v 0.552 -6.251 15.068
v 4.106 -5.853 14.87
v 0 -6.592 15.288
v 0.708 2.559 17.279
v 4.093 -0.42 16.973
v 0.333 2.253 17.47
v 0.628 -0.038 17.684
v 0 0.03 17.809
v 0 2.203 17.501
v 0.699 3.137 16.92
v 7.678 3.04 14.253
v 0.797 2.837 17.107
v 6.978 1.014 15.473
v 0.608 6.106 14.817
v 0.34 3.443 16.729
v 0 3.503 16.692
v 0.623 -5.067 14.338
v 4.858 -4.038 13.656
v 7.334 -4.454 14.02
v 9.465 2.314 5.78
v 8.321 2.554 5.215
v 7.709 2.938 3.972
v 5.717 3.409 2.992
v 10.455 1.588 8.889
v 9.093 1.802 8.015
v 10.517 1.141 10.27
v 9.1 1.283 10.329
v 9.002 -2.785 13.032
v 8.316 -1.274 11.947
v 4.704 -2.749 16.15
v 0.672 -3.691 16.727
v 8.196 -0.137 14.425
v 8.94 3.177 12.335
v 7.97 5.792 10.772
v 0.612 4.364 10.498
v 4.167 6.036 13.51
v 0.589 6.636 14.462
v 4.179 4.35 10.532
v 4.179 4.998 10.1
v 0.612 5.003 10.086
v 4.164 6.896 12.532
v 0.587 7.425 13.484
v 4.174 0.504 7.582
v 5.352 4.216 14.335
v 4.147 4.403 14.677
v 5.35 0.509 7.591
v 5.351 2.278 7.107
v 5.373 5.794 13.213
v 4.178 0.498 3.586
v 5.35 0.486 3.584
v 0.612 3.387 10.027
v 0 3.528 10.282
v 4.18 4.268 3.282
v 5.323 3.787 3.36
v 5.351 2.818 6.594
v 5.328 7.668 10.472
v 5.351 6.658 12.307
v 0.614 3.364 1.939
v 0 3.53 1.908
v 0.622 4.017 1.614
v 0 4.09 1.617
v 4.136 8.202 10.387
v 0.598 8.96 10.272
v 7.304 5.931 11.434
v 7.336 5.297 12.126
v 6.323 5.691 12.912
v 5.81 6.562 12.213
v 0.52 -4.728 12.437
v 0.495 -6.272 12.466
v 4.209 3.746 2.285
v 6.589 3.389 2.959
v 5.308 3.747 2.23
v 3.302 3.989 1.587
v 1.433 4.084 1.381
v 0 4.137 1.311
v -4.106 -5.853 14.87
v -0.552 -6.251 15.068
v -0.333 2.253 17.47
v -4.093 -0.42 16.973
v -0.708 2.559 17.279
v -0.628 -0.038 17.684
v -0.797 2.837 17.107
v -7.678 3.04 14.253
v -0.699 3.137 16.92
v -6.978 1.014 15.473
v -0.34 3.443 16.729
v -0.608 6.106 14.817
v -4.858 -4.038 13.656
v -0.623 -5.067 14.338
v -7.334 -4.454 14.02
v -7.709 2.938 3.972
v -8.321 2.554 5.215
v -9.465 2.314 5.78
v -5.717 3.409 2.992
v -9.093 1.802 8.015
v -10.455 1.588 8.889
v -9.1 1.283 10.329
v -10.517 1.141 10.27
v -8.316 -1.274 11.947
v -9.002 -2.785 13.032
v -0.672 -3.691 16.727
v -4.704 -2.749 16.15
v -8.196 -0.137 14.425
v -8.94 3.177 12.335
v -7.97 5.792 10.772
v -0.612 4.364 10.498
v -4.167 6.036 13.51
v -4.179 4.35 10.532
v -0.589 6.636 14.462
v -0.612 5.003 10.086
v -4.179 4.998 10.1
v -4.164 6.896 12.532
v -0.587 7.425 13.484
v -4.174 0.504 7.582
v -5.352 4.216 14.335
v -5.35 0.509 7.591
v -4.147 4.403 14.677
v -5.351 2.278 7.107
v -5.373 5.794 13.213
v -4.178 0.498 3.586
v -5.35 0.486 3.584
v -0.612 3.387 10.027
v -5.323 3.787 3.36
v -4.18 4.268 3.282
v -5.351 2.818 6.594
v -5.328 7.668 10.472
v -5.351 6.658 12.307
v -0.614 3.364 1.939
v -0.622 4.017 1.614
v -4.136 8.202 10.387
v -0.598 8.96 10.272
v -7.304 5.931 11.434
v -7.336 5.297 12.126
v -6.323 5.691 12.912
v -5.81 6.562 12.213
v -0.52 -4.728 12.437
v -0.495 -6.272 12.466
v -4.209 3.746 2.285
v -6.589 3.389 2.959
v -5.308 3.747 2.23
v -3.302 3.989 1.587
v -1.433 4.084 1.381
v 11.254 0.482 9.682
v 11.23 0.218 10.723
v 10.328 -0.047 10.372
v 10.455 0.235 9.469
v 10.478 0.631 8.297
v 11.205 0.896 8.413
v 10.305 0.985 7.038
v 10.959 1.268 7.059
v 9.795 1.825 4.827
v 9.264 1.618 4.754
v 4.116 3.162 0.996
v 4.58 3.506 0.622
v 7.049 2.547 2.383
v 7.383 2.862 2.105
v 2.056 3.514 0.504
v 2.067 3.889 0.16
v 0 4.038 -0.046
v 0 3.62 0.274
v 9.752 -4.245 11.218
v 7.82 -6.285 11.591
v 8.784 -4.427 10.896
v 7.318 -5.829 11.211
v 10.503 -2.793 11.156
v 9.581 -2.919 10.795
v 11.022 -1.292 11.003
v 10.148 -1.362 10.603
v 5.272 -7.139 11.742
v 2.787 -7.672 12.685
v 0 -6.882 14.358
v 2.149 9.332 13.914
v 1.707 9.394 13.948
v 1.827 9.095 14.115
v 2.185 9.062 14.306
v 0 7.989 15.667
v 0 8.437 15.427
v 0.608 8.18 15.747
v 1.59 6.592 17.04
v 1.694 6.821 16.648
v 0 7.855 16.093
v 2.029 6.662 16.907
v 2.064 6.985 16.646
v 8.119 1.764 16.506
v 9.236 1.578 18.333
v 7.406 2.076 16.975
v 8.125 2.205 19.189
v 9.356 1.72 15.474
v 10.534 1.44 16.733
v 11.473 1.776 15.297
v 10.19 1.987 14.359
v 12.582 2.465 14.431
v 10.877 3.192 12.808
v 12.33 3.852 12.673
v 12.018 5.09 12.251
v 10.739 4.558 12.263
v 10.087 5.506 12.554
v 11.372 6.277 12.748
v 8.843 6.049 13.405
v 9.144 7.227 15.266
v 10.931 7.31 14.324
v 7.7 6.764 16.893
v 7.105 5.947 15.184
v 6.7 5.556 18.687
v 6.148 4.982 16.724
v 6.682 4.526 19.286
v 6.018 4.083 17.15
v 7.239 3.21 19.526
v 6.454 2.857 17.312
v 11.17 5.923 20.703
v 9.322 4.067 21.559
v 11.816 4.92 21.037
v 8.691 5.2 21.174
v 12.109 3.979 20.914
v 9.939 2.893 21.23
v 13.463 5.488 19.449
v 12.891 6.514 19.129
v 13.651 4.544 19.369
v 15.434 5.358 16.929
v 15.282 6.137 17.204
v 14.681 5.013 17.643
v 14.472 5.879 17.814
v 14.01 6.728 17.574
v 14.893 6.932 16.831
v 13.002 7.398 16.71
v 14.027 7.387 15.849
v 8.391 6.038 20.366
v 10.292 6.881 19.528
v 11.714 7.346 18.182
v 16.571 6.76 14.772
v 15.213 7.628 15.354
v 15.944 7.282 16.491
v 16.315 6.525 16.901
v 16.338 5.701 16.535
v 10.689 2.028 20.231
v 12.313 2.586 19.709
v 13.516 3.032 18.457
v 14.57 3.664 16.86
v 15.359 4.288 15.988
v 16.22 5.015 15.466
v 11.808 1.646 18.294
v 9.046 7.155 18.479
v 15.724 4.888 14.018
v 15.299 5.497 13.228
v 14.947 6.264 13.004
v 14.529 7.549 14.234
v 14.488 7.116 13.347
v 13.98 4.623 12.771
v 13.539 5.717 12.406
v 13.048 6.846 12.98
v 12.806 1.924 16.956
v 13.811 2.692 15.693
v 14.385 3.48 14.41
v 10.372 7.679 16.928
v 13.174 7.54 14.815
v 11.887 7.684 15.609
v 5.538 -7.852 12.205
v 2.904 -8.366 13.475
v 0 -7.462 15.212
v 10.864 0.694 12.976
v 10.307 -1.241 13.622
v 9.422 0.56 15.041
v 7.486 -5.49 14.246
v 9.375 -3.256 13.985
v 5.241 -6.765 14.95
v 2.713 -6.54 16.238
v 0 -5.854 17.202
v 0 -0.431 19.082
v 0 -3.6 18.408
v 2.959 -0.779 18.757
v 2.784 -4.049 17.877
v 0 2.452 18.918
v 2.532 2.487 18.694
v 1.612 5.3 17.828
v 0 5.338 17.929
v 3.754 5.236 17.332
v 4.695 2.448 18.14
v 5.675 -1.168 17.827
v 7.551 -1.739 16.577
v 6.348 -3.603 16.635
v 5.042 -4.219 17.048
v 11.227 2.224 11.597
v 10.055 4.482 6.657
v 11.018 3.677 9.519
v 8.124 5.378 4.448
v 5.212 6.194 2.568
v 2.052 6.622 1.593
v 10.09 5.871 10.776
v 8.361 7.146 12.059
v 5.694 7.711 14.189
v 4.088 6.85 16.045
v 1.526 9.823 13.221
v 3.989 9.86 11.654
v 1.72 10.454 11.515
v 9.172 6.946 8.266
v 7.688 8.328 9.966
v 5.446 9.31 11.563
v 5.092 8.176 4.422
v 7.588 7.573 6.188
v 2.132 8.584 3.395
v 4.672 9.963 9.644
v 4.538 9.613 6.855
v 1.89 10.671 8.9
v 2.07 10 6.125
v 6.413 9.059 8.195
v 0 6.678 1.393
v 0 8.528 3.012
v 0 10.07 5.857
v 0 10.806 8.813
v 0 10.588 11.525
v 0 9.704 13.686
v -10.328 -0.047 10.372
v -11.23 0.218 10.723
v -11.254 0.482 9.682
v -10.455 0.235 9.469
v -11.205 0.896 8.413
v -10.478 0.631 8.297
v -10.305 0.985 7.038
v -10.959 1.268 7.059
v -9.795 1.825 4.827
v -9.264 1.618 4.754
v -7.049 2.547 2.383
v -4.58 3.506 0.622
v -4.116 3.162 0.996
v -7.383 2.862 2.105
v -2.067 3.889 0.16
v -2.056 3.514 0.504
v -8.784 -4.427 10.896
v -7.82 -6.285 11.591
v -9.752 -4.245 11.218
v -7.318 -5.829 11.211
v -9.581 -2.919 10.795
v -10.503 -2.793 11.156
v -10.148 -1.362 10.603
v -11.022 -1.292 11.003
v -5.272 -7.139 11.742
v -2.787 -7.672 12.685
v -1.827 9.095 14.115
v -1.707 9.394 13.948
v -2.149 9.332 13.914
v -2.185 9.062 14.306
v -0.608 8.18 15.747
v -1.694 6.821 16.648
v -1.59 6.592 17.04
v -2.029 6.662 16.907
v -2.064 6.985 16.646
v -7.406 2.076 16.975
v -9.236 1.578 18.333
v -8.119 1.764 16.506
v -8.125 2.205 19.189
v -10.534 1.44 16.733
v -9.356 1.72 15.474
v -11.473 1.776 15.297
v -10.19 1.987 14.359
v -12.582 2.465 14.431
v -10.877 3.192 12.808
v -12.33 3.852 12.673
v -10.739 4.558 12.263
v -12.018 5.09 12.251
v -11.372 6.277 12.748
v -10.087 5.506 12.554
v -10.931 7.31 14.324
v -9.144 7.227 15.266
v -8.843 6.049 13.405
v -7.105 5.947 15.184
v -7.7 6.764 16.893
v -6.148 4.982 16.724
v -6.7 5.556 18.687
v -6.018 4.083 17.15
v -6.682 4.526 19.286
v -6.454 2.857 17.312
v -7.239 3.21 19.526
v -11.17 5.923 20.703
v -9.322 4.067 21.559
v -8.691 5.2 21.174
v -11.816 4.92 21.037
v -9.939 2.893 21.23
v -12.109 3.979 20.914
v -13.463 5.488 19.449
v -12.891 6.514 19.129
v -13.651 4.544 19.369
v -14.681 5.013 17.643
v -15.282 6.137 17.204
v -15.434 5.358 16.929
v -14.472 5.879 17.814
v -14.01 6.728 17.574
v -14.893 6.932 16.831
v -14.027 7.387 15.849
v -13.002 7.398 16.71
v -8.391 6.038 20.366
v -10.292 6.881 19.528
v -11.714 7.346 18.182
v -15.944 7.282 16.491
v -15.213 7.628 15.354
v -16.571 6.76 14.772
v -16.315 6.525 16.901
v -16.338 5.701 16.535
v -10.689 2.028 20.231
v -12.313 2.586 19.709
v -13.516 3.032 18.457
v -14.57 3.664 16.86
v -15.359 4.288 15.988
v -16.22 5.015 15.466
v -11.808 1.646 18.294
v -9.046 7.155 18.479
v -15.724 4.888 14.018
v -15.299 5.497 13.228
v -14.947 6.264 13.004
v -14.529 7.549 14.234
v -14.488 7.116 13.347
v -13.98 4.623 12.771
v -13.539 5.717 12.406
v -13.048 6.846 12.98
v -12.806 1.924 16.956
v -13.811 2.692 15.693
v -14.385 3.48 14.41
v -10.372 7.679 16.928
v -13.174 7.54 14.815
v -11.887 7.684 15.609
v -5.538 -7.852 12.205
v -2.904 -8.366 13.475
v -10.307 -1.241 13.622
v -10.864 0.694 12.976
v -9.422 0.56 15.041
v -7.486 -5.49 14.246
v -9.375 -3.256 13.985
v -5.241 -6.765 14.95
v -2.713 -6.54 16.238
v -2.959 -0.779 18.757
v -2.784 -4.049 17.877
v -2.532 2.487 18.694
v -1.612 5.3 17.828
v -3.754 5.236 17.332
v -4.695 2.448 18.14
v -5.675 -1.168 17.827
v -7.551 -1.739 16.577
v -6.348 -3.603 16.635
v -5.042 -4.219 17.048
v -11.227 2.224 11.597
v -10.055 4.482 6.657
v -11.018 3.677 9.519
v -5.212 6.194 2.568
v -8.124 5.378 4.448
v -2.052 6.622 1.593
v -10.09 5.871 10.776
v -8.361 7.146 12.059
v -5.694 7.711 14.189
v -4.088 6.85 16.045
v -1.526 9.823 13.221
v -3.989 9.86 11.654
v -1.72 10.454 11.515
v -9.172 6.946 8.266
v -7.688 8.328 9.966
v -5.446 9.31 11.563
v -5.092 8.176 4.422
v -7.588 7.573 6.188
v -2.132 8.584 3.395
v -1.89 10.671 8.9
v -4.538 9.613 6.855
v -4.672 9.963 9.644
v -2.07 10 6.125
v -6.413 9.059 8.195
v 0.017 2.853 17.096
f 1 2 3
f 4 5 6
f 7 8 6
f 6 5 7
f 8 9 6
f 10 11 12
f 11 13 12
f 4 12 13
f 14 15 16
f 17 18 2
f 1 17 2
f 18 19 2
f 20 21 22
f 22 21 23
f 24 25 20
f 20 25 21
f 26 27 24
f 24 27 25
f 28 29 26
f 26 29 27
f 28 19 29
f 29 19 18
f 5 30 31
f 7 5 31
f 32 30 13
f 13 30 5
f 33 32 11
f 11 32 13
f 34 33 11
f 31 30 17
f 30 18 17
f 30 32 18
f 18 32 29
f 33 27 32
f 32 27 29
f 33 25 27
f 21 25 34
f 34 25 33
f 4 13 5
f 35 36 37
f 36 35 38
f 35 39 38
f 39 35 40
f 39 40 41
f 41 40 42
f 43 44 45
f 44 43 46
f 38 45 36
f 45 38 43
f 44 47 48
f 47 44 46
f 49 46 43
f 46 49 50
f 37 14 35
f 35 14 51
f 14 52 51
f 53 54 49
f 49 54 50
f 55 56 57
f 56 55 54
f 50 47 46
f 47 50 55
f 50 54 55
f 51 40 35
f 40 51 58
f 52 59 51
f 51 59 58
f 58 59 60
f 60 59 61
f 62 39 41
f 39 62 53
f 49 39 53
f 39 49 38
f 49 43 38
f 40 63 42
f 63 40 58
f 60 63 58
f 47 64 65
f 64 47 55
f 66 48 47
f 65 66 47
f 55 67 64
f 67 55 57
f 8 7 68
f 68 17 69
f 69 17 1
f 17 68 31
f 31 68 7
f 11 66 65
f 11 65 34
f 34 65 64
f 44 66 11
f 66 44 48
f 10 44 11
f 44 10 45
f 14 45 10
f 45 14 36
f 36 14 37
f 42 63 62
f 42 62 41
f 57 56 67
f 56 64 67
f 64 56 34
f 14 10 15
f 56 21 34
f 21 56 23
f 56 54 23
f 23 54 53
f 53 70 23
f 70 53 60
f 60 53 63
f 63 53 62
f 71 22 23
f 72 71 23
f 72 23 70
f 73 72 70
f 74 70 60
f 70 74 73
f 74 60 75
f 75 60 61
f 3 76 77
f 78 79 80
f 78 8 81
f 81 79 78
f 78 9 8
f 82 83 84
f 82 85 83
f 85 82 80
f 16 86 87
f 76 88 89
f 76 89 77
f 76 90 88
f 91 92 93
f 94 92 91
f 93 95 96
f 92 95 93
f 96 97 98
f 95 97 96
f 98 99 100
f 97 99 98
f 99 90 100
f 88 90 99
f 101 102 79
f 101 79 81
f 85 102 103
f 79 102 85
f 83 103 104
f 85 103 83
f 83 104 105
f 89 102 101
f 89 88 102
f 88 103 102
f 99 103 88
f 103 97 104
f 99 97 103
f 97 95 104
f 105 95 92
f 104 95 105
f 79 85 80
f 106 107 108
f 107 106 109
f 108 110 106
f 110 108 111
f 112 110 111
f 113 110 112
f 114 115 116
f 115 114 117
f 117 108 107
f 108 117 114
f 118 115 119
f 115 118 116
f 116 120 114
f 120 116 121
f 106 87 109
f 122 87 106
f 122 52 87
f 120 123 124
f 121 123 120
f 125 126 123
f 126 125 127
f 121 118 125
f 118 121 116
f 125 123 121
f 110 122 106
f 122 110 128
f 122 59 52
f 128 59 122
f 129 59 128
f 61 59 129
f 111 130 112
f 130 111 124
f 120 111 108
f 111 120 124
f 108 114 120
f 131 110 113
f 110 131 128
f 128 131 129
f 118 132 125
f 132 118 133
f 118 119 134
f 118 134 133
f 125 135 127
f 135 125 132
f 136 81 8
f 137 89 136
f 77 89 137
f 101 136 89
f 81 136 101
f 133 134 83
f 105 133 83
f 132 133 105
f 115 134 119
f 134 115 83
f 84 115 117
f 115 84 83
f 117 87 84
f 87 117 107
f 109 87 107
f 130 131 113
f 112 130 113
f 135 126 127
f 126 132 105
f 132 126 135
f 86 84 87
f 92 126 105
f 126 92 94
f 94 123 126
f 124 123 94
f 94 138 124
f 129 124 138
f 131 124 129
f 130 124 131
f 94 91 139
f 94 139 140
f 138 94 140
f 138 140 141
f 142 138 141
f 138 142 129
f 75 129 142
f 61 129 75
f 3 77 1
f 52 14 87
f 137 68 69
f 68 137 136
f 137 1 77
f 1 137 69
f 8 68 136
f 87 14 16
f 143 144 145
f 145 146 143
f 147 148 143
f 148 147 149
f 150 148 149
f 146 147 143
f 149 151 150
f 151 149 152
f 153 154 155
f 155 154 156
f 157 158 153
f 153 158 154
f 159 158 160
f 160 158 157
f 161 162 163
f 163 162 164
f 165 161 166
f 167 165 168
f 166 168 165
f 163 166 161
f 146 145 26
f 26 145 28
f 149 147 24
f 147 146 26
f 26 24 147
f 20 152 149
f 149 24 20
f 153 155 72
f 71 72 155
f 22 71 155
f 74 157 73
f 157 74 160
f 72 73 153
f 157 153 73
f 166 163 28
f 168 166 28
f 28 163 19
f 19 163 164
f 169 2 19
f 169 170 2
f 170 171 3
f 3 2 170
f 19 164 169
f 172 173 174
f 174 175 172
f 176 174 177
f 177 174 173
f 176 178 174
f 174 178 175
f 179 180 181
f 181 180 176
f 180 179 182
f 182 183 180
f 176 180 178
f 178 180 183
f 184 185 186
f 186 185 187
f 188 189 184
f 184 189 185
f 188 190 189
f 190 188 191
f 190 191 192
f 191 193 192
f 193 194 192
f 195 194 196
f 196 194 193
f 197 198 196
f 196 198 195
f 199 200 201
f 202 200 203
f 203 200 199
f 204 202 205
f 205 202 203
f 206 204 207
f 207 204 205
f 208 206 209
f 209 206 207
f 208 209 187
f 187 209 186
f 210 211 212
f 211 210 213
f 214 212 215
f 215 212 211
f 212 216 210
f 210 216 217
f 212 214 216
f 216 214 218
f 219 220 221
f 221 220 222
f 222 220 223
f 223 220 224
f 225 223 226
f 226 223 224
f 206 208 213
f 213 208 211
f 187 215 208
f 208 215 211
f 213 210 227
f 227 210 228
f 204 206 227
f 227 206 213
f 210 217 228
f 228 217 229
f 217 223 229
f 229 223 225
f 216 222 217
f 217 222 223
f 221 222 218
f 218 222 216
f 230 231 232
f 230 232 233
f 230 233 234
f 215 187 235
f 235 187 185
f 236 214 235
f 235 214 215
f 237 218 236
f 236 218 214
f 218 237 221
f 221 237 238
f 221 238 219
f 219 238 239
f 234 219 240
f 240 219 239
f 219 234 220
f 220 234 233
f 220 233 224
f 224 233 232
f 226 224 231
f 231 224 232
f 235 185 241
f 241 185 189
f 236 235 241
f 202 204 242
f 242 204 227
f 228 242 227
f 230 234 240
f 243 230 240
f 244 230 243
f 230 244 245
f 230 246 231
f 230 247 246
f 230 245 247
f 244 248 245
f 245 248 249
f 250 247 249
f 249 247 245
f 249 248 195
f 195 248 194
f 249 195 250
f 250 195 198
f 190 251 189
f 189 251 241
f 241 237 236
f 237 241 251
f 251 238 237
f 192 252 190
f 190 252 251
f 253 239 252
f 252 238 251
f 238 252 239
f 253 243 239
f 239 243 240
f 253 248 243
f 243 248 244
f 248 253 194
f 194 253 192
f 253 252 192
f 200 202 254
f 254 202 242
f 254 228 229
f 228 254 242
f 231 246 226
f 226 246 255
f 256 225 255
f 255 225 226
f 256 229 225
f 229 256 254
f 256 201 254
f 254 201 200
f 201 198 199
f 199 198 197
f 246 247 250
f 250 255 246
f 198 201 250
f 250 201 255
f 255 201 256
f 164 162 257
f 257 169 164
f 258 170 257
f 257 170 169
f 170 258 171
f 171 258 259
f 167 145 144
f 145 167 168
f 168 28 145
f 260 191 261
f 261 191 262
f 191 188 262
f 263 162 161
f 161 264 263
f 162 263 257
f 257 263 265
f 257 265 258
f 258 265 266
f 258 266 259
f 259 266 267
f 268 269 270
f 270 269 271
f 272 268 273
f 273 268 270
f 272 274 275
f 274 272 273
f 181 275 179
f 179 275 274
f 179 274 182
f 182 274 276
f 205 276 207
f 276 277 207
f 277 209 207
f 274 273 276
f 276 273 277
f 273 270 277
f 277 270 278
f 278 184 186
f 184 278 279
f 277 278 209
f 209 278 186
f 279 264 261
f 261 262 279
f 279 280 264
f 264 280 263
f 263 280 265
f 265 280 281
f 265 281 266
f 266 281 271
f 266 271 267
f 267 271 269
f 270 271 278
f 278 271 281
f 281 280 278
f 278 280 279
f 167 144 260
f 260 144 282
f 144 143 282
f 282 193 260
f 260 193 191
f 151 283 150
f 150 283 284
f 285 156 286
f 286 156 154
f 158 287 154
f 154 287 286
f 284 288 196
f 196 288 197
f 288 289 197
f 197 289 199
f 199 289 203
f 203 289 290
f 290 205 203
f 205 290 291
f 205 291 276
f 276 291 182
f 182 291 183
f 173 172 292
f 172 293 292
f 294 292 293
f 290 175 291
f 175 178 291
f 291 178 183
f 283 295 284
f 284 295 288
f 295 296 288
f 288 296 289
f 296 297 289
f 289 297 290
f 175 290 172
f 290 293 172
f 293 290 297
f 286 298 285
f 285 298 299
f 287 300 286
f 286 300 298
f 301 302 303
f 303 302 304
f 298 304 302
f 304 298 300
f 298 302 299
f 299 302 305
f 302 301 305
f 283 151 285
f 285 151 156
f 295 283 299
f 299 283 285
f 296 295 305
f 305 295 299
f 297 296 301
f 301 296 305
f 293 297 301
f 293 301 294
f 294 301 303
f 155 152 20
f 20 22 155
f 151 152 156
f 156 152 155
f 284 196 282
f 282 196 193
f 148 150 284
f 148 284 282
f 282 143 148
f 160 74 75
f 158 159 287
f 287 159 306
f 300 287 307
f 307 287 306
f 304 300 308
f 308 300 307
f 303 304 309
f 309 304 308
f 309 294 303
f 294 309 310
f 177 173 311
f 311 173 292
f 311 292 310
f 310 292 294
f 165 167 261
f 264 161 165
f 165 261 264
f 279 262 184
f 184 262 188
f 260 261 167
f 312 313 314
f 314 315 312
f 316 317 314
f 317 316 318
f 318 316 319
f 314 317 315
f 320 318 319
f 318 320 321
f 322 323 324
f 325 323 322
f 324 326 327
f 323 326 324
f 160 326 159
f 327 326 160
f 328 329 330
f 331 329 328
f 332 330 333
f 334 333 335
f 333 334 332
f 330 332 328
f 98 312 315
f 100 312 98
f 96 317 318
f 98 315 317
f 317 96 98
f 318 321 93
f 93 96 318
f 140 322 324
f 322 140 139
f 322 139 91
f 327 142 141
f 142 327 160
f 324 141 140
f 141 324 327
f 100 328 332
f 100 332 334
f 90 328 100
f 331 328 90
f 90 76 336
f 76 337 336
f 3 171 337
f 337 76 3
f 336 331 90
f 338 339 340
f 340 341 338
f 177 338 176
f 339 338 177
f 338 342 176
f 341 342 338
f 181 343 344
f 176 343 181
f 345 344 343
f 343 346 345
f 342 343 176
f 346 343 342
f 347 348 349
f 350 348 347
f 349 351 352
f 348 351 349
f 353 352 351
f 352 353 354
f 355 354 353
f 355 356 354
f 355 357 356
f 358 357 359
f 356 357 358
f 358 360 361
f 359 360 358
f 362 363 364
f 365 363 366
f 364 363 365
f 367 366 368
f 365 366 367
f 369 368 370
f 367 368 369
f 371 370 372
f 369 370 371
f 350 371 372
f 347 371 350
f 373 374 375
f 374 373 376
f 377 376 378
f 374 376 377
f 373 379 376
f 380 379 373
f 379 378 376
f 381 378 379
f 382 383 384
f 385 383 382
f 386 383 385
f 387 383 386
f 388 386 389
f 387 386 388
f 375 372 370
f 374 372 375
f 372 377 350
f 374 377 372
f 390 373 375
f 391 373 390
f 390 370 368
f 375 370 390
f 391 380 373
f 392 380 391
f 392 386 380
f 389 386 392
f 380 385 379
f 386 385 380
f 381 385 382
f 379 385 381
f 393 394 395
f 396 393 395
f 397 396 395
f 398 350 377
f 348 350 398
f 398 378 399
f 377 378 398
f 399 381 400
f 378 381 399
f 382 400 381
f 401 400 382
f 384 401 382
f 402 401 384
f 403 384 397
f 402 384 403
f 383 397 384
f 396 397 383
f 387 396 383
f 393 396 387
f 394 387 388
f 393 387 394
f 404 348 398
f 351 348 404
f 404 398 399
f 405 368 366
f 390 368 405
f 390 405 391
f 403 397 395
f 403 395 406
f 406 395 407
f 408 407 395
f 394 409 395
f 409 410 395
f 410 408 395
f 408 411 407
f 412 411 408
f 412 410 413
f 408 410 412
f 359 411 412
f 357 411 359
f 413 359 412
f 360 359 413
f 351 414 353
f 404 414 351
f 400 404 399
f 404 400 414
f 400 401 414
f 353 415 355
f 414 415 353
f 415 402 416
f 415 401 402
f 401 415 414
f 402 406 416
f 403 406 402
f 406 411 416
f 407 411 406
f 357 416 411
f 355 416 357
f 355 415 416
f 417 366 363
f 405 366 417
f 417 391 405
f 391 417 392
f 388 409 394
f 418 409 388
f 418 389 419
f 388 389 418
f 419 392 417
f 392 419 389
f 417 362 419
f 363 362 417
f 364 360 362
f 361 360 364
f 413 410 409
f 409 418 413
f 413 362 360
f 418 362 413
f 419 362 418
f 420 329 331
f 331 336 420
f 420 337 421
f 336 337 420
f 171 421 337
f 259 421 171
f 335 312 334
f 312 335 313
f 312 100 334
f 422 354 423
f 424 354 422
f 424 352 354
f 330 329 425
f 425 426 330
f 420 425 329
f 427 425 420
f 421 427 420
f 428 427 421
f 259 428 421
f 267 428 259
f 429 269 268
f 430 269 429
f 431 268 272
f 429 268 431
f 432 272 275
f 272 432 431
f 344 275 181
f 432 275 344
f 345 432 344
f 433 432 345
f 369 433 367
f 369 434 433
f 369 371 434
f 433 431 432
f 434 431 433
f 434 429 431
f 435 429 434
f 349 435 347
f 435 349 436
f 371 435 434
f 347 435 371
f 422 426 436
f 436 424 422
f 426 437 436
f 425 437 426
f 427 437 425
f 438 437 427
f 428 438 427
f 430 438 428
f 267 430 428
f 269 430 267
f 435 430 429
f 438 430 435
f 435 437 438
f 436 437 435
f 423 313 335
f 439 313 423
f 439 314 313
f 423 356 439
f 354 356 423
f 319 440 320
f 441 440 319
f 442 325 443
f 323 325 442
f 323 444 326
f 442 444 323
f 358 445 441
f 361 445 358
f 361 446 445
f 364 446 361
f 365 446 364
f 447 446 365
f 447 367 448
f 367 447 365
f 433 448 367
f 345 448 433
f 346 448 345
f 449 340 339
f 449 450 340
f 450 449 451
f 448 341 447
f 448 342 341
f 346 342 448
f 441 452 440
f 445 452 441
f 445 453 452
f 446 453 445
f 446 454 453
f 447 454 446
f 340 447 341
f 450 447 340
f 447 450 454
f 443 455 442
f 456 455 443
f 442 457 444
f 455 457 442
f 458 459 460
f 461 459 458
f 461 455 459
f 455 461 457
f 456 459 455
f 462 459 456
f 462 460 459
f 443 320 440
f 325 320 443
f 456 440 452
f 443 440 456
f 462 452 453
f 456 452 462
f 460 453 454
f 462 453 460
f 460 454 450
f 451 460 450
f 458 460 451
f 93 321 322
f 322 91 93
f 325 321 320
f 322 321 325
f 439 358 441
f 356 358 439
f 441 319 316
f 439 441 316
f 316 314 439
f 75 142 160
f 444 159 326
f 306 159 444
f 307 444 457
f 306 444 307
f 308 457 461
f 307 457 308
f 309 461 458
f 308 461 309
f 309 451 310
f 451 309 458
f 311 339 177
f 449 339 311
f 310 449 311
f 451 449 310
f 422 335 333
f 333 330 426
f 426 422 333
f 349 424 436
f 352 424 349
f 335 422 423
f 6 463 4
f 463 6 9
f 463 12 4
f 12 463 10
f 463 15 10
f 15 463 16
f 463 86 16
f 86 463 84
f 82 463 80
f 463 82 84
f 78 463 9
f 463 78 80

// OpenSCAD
use <../lib.scad>
use <s/u9446s01.scad>
use <s/u9447s01.scad>
function ldraw_lib__u9446() = [
// 0 ~Minifig Hair Powerpuff Girls Bubbles
// 0 Name: u9446.dat
// 0 Author: Magnus Forsberg [MagFors]
// 0 !LDRAW_ORG Part UPDATE 2023-05
// 0 !LICENSE Licensed under CC BY 4.0 : see CAreadme.txt
// 
// 0 BFC CERTIFY CCW
  [0,"BFC","CERTIFY"],
  [0,"BFC","CCW"],
// 
// 0 !HISTORY 2023-10-31 [OrionP] Official Update 2023-05
// 
// 
// 1 16 0 0 0 1 0 0 0 1 0 0 0 1 s\u9447s01.dat
  [1,16,0,0,0,1,0,0,0,1,0,0,0,1, ldraw_lib__s__u9447s01()],
// 1 16 0 0 0 1 0 0 0 1 0 0 0 1 s\u9446s01.dat
  [1,16,0,0,0,1,0,0,0,1,0,0,0,1, ldraw_lib__s__u9446s01()],
// 1 16 0 0 0 -1 0 0 0 1 0 0 0 1 s\u9446s01.dat
  [1,16,0,0,0,-1,0,0,0,1,0,0,0,1, ldraw_lib__s__u9446s01()],
// 
// 4 16 .833 -43.674 5.633 0 -43.753 5.507 .042 -42.741 7.1325 1.77 -43.198 6.398
  [4,16,.833,-43.674,5.633,0,-43.753,5.507,.042,-42.741,7.1325,1.77,-43.198,6.398],
// 4 16 1.993 -42.767 7.092 1.77 -43.198 6.398 .042 -42.741 7.1325 1.747 -42.299 7.842
  [4,16,1.993,-42.767,7.092,1.77,-43.198,6.398,.042,-42.741,7.1325,1.747,-42.299,7.842],
// 4 16 .85 -41.823 8.608 1.747 -42.299 7.842 .042 -42.741 7.1325 0 -41.729 8.758
  [4,16,.85,-41.823,8.608,1.747,-42.299,7.842,.042,-42.741,7.1325,0,-41.729,8.758],
// 4 16 -.85 -41.823 8.608 0 -41.729 8.758 .042 -42.741 7.1325 -1.747 -42.299 7.842
  [4,16,-.85,-41.823,8.608,0,-41.729,8.758,.042,-42.741,7.1325,-1.747,-42.299,7.842],
// 4 16 -1.993 -42.767 7.092 -1.747 -42.299 7.842 .042 -42.741 7.1325 -1.77 -43.198 6.398
  [4,16,-1.993,-42.767,7.092,-1.747,-42.299,7.842,.042,-42.741,7.1325,-1.77,-43.198,6.398],
// 4 16 -.833 -43.674 5.633 -1.77 -43.198 6.398 .042 -42.741 7.1325 0 -43.753 5.507
  [4,16,-.833,-43.674,5.633,-1.77,-43.198,6.398,.042,-42.741,7.1325,0,-43.753,5.507],
// 5 24 0 -41.729 8.758 -.85 -41.823 8.608 -1.435 -37.043 15.265 .042 -42.741 7.1325
  [5,24,0,-41.729,8.758,-.85,-41.823,8.608,-1.435,-37.043,15.265,.042,-42.741,7.1325],
// 5 24 -1.77 -43.198 6.398 -.833 -43.674 5.633 .042 -42.741 7.1325 -10.148 -42.433 -1.051
  [5,24,-1.77,-43.198,6.398,-.833,-43.674,5.633,.042,-42.741,7.1325,-10.148,-42.433,-1.051],
// 5 24 1.747 -42.299 7.842 .85 -41.823 8.608 .042 -42.741 7.1325 1.519 -37.043 15.265
  [5,24,1.747,-42.299,7.842,.85,-41.823,8.608,.042,-42.741,7.1325,1.519,-37.043,15.265],
// 5 24 -1.747 -42.299 7.842 -1.993 -42.767 7.092 .042 -42.741 7.1325 -19.11 -35.633 7.599
  [5,24,-1.747,-42.299,7.842,-1.993,-42.767,7.092,.042,-42.741,7.1325,-19.11,-35.633,7.599],
// 5 24 -1.993 -42.767 7.092 -1.77 -43.198 6.398 -1.747 -42.299 7.842 -17.36 -38.683 2.536
  [5,24,-1.993,-42.767,7.092,-1.77,-43.198,6.398,-1.747,-42.299,7.842,-17.36,-38.683,2.536],
// 5 24 .833 -43.674 5.633 1.77 -43.198 6.398 0 -43.753 5.507 10.232 -42.433 -1.051
  [5,24,.833,-43.674,5.633,1.77,-43.198,6.398,0,-43.753,5.507,10.232,-42.433,-1.051],
// 5 24 1.77 -43.198 6.398 1.993 -42.767 7.092 .042 -42.741 7.1325 17.444 -38.683 2.536
  [5,24,1.77,-43.198,6.398,1.993,-42.767,7.092,.042,-42.741,7.1325,17.444,-38.683,2.536],
// 5 24 .85 -41.823 8.608 0 -41.729 8.758 1.519 -37.043 15.265 1.747 -42.299 7.842
  [5,24,.85,-41.823,8.608,0,-41.729,8.758,1.519,-37.043,15.265,1.747,-42.299,7.842],
// 5 24 -.85 -41.823 8.608 -1.747 -42.299 7.842 -1.435 -37.043 15.265 0 -41.729 8.758
  [5,24,-.85,-41.823,8.608,-1.747,-42.299,7.842,-1.435,-37.043,15.265,0,-41.729,8.758],
// 5 24 -.833 -43.674 5.633 0 -43.753 5.507 -1.77 -43.198 6.398 0 -44.522 .075
  [5,24,-.833,-43.674,5.633,0,-43.753,5.507,-1.77,-43.198,6.398,0,-44.522,.075],
// 5 24 0 -43.753 5.507 .833 -43.674 5.633 0 -44.522 .075 .042 -42.741 7.1325
  [5,24,0,-43.753,5.507,.833,-43.674,5.633,0,-44.522,.075,.042,-42.741,7.1325],
// 5 24 1.993 -42.767 7.092 1.747 -42.299 7.842 1.77 -43.198 6.398 19.194 -35.633 7.599
  [5,24,1.993,-42.767,7.092,1.747,-42.299,7.842,1.77,-43.198,6.398,19.194,-35.633,7.599],
// 
// 5 24 0 -14.643 25.174 0 -22.033 27.015 5.176 -15.313 24.999 -5.176 -15.313 24.999
  [5,24,0,-14.643,25.174,0,-22.033,27.015,5.176,-15.313,24.999,-5.176,-15.313,24.999],
// 5 24 0 -46.02 -8.999 0 -43.006 -14.635 -6.961 -44.693 -10.123 6.961 -44.693 -10.123
  [5,24,0,-46.02,-8.999,0,-43.006,-14.635,-6.961,-44.693,-10.123,6.961,-44.693,-10.123],
// 5 24 0 -34.215 24.259 0 -38.567 21.092 4.268 -34.871 23.485 -4.268 -34.871 23.485
  [5,24,0,-34.215,24.259,0,-38.567,21.092,4.268,-34.871,23.485,-4.268,-34.871,23.485],
// 5 24 0 -40.232 19.637 0 -44.822 13.345 3.975 -42.6 16.481 -3.975 -42.6 16.481
  [5,24,0,-40.232,19.637,0,-44.822,13.345,3.975,-42.6,16.481,-3.975,-42.6,16.481],
// 5 24 0 -47.294 6.131 0 -47.704 -1.078 -6.331 -46.736 6.217 6.331 -46.736 6.217
  [5,24,0,-47.294,6.131,0,-47.704,-1.078,-6.331,-46.736,6.217,6.331,-46.736,6.217],
// 5 24 0 -22.033 27.015 0 -28.813 26.469 4.3 -28.787 26.134 -4.3 -28.787 26.134
  [5,24,0,-22.033,27.015,0,-28.813,26.469,4.3,-28.787,26.134,-4.3,-28.787,26.134],
// 5 24 0 -47.704 -1.078 0 -46.02 -8.999 7.398 -46.893 -1.947 -7.398 -46.893 -1.947
  [5,24,0,-47.704,-1.078,0,-46.02,-8.999,7.398,-46.893,-1.947,-7.398,-46.893,-1.947],
// 5 24 0 -28.813 26.469 0 -34.215 24.259 -3.814 -33.053 24.557 3.814 -33.053 24.557
  [5,24,0,-28.813,26.469,0,-34.215,24.259,-3.814,-33.053,24.557,3.814,-33.053,24.557],
// 5 24 0 -38.567 21.092 0 -39.167 19.972 -4.568 -35.287 22.738 4.568 -35.287 22.738
  [5,24,0,-38.567,21.092,0,-39.167,19.972,-4.568,-35.287,22.738,4.568,-35.287,22.738],
// 5 24 0 -7.529 21.319 0 -14.643 25.174 -5.329 -8.487 21.461 5.329 -8.487 21.461
  [5,24,0,-7.529,21.319,0,-14.643,25.174,-5.329,-8.487,21.461,5.329,-8.487,21.461],
// 5 24 0 -3.482 16.694 0 -7.529 21.319 -5.129 -3.982 16.554 5.129 -3.982 16.554
  [5,24,0,-3.482,16.694,0,-7.529,21.319,-5.129,-3.982,16.554,5.129,-3.982,16.554],
// 5 24 0 -39.167 19.972 0 -40.232 19.637 4.234 -41.619 17.053 -4.234 -41.619 17.053
  [5,24,0,-39.167,19.972,0,-40.232,19.637,4.234,-41.619,17.053,-4.234,-41.619,17.053],
// 5 24 0 -44.822 13.345 0 -47.294 6.131 -4.029 -44.57 13.251 4.029 -44.57 13.251
  [5,24,0,-44.822,13.345,0,-47.294,6.131,-4.029,-44.57,13.251,4.029,-44.57,13.251],
// 2 24 0 -38.03 -18.655 0 -35.896 -17.204
  [2,24,0,-38.03,-18.655,0,-35.896,-17.204],
// 5 24 0 -43.006 -14.635 0 -38.03 -18.655 6.783 -40.594 -16.349 -6.783 -40.594 -16.349
  [5,24,0,-43.006,-14.635,0,-38.03,-18.655,6.783,-40.594,-16.349,-6.783,-40.594,-16.349],
// 5 24 0 -.686 9.051 0 .114 10.094 -5.167 -.4 9.723 5.167 -.4 9.723
  [5,24,0,-.686,9.051,0,.114,10.094,-5.167,-.4,9.723,5.167,-.4,9.723],
// 5 24 0 .114 10.094 0 -3.482 16.694 -5.129 -3.982 16.554 5.129 -3.982 16.554
  [5,24,0,.114,10.094,0,-3.482,16.694,-5.129,-3.982,16.554,5.129,-3.982,16.554],
// 5 24 0 -35.896 -17.204 0 -38.22 -16.481 -6.968 -31.712 -19.179 6.968 -31.712 -19.179
  [5,24,0,-35.896,-17.204,0,-38.22,-16.481,-6.968,-31.712,-19.179,6.968,-31.712,-19.179],
// 5 24 0 -3.278 10.342 0 -.686 9.051 3.583 -3.453 10.211 -3.583 -3.453 10.211
  [5,24,0,-3.278,10.342,0,-.686,9.051,3.583,-3.453,10.211,-3.583,-3.453,10.211],
];
module ldraw_lib__u9446(step=0, col=false, unit=2/5, alt=false, line=0.2, solid=!$preview)
    makepoly(ldraw_lib__u9446(), step=step, col=col, unit=unit, alt=alt, line=line, solid=solid);
ldraw_lib__u9446(line=0.2);
